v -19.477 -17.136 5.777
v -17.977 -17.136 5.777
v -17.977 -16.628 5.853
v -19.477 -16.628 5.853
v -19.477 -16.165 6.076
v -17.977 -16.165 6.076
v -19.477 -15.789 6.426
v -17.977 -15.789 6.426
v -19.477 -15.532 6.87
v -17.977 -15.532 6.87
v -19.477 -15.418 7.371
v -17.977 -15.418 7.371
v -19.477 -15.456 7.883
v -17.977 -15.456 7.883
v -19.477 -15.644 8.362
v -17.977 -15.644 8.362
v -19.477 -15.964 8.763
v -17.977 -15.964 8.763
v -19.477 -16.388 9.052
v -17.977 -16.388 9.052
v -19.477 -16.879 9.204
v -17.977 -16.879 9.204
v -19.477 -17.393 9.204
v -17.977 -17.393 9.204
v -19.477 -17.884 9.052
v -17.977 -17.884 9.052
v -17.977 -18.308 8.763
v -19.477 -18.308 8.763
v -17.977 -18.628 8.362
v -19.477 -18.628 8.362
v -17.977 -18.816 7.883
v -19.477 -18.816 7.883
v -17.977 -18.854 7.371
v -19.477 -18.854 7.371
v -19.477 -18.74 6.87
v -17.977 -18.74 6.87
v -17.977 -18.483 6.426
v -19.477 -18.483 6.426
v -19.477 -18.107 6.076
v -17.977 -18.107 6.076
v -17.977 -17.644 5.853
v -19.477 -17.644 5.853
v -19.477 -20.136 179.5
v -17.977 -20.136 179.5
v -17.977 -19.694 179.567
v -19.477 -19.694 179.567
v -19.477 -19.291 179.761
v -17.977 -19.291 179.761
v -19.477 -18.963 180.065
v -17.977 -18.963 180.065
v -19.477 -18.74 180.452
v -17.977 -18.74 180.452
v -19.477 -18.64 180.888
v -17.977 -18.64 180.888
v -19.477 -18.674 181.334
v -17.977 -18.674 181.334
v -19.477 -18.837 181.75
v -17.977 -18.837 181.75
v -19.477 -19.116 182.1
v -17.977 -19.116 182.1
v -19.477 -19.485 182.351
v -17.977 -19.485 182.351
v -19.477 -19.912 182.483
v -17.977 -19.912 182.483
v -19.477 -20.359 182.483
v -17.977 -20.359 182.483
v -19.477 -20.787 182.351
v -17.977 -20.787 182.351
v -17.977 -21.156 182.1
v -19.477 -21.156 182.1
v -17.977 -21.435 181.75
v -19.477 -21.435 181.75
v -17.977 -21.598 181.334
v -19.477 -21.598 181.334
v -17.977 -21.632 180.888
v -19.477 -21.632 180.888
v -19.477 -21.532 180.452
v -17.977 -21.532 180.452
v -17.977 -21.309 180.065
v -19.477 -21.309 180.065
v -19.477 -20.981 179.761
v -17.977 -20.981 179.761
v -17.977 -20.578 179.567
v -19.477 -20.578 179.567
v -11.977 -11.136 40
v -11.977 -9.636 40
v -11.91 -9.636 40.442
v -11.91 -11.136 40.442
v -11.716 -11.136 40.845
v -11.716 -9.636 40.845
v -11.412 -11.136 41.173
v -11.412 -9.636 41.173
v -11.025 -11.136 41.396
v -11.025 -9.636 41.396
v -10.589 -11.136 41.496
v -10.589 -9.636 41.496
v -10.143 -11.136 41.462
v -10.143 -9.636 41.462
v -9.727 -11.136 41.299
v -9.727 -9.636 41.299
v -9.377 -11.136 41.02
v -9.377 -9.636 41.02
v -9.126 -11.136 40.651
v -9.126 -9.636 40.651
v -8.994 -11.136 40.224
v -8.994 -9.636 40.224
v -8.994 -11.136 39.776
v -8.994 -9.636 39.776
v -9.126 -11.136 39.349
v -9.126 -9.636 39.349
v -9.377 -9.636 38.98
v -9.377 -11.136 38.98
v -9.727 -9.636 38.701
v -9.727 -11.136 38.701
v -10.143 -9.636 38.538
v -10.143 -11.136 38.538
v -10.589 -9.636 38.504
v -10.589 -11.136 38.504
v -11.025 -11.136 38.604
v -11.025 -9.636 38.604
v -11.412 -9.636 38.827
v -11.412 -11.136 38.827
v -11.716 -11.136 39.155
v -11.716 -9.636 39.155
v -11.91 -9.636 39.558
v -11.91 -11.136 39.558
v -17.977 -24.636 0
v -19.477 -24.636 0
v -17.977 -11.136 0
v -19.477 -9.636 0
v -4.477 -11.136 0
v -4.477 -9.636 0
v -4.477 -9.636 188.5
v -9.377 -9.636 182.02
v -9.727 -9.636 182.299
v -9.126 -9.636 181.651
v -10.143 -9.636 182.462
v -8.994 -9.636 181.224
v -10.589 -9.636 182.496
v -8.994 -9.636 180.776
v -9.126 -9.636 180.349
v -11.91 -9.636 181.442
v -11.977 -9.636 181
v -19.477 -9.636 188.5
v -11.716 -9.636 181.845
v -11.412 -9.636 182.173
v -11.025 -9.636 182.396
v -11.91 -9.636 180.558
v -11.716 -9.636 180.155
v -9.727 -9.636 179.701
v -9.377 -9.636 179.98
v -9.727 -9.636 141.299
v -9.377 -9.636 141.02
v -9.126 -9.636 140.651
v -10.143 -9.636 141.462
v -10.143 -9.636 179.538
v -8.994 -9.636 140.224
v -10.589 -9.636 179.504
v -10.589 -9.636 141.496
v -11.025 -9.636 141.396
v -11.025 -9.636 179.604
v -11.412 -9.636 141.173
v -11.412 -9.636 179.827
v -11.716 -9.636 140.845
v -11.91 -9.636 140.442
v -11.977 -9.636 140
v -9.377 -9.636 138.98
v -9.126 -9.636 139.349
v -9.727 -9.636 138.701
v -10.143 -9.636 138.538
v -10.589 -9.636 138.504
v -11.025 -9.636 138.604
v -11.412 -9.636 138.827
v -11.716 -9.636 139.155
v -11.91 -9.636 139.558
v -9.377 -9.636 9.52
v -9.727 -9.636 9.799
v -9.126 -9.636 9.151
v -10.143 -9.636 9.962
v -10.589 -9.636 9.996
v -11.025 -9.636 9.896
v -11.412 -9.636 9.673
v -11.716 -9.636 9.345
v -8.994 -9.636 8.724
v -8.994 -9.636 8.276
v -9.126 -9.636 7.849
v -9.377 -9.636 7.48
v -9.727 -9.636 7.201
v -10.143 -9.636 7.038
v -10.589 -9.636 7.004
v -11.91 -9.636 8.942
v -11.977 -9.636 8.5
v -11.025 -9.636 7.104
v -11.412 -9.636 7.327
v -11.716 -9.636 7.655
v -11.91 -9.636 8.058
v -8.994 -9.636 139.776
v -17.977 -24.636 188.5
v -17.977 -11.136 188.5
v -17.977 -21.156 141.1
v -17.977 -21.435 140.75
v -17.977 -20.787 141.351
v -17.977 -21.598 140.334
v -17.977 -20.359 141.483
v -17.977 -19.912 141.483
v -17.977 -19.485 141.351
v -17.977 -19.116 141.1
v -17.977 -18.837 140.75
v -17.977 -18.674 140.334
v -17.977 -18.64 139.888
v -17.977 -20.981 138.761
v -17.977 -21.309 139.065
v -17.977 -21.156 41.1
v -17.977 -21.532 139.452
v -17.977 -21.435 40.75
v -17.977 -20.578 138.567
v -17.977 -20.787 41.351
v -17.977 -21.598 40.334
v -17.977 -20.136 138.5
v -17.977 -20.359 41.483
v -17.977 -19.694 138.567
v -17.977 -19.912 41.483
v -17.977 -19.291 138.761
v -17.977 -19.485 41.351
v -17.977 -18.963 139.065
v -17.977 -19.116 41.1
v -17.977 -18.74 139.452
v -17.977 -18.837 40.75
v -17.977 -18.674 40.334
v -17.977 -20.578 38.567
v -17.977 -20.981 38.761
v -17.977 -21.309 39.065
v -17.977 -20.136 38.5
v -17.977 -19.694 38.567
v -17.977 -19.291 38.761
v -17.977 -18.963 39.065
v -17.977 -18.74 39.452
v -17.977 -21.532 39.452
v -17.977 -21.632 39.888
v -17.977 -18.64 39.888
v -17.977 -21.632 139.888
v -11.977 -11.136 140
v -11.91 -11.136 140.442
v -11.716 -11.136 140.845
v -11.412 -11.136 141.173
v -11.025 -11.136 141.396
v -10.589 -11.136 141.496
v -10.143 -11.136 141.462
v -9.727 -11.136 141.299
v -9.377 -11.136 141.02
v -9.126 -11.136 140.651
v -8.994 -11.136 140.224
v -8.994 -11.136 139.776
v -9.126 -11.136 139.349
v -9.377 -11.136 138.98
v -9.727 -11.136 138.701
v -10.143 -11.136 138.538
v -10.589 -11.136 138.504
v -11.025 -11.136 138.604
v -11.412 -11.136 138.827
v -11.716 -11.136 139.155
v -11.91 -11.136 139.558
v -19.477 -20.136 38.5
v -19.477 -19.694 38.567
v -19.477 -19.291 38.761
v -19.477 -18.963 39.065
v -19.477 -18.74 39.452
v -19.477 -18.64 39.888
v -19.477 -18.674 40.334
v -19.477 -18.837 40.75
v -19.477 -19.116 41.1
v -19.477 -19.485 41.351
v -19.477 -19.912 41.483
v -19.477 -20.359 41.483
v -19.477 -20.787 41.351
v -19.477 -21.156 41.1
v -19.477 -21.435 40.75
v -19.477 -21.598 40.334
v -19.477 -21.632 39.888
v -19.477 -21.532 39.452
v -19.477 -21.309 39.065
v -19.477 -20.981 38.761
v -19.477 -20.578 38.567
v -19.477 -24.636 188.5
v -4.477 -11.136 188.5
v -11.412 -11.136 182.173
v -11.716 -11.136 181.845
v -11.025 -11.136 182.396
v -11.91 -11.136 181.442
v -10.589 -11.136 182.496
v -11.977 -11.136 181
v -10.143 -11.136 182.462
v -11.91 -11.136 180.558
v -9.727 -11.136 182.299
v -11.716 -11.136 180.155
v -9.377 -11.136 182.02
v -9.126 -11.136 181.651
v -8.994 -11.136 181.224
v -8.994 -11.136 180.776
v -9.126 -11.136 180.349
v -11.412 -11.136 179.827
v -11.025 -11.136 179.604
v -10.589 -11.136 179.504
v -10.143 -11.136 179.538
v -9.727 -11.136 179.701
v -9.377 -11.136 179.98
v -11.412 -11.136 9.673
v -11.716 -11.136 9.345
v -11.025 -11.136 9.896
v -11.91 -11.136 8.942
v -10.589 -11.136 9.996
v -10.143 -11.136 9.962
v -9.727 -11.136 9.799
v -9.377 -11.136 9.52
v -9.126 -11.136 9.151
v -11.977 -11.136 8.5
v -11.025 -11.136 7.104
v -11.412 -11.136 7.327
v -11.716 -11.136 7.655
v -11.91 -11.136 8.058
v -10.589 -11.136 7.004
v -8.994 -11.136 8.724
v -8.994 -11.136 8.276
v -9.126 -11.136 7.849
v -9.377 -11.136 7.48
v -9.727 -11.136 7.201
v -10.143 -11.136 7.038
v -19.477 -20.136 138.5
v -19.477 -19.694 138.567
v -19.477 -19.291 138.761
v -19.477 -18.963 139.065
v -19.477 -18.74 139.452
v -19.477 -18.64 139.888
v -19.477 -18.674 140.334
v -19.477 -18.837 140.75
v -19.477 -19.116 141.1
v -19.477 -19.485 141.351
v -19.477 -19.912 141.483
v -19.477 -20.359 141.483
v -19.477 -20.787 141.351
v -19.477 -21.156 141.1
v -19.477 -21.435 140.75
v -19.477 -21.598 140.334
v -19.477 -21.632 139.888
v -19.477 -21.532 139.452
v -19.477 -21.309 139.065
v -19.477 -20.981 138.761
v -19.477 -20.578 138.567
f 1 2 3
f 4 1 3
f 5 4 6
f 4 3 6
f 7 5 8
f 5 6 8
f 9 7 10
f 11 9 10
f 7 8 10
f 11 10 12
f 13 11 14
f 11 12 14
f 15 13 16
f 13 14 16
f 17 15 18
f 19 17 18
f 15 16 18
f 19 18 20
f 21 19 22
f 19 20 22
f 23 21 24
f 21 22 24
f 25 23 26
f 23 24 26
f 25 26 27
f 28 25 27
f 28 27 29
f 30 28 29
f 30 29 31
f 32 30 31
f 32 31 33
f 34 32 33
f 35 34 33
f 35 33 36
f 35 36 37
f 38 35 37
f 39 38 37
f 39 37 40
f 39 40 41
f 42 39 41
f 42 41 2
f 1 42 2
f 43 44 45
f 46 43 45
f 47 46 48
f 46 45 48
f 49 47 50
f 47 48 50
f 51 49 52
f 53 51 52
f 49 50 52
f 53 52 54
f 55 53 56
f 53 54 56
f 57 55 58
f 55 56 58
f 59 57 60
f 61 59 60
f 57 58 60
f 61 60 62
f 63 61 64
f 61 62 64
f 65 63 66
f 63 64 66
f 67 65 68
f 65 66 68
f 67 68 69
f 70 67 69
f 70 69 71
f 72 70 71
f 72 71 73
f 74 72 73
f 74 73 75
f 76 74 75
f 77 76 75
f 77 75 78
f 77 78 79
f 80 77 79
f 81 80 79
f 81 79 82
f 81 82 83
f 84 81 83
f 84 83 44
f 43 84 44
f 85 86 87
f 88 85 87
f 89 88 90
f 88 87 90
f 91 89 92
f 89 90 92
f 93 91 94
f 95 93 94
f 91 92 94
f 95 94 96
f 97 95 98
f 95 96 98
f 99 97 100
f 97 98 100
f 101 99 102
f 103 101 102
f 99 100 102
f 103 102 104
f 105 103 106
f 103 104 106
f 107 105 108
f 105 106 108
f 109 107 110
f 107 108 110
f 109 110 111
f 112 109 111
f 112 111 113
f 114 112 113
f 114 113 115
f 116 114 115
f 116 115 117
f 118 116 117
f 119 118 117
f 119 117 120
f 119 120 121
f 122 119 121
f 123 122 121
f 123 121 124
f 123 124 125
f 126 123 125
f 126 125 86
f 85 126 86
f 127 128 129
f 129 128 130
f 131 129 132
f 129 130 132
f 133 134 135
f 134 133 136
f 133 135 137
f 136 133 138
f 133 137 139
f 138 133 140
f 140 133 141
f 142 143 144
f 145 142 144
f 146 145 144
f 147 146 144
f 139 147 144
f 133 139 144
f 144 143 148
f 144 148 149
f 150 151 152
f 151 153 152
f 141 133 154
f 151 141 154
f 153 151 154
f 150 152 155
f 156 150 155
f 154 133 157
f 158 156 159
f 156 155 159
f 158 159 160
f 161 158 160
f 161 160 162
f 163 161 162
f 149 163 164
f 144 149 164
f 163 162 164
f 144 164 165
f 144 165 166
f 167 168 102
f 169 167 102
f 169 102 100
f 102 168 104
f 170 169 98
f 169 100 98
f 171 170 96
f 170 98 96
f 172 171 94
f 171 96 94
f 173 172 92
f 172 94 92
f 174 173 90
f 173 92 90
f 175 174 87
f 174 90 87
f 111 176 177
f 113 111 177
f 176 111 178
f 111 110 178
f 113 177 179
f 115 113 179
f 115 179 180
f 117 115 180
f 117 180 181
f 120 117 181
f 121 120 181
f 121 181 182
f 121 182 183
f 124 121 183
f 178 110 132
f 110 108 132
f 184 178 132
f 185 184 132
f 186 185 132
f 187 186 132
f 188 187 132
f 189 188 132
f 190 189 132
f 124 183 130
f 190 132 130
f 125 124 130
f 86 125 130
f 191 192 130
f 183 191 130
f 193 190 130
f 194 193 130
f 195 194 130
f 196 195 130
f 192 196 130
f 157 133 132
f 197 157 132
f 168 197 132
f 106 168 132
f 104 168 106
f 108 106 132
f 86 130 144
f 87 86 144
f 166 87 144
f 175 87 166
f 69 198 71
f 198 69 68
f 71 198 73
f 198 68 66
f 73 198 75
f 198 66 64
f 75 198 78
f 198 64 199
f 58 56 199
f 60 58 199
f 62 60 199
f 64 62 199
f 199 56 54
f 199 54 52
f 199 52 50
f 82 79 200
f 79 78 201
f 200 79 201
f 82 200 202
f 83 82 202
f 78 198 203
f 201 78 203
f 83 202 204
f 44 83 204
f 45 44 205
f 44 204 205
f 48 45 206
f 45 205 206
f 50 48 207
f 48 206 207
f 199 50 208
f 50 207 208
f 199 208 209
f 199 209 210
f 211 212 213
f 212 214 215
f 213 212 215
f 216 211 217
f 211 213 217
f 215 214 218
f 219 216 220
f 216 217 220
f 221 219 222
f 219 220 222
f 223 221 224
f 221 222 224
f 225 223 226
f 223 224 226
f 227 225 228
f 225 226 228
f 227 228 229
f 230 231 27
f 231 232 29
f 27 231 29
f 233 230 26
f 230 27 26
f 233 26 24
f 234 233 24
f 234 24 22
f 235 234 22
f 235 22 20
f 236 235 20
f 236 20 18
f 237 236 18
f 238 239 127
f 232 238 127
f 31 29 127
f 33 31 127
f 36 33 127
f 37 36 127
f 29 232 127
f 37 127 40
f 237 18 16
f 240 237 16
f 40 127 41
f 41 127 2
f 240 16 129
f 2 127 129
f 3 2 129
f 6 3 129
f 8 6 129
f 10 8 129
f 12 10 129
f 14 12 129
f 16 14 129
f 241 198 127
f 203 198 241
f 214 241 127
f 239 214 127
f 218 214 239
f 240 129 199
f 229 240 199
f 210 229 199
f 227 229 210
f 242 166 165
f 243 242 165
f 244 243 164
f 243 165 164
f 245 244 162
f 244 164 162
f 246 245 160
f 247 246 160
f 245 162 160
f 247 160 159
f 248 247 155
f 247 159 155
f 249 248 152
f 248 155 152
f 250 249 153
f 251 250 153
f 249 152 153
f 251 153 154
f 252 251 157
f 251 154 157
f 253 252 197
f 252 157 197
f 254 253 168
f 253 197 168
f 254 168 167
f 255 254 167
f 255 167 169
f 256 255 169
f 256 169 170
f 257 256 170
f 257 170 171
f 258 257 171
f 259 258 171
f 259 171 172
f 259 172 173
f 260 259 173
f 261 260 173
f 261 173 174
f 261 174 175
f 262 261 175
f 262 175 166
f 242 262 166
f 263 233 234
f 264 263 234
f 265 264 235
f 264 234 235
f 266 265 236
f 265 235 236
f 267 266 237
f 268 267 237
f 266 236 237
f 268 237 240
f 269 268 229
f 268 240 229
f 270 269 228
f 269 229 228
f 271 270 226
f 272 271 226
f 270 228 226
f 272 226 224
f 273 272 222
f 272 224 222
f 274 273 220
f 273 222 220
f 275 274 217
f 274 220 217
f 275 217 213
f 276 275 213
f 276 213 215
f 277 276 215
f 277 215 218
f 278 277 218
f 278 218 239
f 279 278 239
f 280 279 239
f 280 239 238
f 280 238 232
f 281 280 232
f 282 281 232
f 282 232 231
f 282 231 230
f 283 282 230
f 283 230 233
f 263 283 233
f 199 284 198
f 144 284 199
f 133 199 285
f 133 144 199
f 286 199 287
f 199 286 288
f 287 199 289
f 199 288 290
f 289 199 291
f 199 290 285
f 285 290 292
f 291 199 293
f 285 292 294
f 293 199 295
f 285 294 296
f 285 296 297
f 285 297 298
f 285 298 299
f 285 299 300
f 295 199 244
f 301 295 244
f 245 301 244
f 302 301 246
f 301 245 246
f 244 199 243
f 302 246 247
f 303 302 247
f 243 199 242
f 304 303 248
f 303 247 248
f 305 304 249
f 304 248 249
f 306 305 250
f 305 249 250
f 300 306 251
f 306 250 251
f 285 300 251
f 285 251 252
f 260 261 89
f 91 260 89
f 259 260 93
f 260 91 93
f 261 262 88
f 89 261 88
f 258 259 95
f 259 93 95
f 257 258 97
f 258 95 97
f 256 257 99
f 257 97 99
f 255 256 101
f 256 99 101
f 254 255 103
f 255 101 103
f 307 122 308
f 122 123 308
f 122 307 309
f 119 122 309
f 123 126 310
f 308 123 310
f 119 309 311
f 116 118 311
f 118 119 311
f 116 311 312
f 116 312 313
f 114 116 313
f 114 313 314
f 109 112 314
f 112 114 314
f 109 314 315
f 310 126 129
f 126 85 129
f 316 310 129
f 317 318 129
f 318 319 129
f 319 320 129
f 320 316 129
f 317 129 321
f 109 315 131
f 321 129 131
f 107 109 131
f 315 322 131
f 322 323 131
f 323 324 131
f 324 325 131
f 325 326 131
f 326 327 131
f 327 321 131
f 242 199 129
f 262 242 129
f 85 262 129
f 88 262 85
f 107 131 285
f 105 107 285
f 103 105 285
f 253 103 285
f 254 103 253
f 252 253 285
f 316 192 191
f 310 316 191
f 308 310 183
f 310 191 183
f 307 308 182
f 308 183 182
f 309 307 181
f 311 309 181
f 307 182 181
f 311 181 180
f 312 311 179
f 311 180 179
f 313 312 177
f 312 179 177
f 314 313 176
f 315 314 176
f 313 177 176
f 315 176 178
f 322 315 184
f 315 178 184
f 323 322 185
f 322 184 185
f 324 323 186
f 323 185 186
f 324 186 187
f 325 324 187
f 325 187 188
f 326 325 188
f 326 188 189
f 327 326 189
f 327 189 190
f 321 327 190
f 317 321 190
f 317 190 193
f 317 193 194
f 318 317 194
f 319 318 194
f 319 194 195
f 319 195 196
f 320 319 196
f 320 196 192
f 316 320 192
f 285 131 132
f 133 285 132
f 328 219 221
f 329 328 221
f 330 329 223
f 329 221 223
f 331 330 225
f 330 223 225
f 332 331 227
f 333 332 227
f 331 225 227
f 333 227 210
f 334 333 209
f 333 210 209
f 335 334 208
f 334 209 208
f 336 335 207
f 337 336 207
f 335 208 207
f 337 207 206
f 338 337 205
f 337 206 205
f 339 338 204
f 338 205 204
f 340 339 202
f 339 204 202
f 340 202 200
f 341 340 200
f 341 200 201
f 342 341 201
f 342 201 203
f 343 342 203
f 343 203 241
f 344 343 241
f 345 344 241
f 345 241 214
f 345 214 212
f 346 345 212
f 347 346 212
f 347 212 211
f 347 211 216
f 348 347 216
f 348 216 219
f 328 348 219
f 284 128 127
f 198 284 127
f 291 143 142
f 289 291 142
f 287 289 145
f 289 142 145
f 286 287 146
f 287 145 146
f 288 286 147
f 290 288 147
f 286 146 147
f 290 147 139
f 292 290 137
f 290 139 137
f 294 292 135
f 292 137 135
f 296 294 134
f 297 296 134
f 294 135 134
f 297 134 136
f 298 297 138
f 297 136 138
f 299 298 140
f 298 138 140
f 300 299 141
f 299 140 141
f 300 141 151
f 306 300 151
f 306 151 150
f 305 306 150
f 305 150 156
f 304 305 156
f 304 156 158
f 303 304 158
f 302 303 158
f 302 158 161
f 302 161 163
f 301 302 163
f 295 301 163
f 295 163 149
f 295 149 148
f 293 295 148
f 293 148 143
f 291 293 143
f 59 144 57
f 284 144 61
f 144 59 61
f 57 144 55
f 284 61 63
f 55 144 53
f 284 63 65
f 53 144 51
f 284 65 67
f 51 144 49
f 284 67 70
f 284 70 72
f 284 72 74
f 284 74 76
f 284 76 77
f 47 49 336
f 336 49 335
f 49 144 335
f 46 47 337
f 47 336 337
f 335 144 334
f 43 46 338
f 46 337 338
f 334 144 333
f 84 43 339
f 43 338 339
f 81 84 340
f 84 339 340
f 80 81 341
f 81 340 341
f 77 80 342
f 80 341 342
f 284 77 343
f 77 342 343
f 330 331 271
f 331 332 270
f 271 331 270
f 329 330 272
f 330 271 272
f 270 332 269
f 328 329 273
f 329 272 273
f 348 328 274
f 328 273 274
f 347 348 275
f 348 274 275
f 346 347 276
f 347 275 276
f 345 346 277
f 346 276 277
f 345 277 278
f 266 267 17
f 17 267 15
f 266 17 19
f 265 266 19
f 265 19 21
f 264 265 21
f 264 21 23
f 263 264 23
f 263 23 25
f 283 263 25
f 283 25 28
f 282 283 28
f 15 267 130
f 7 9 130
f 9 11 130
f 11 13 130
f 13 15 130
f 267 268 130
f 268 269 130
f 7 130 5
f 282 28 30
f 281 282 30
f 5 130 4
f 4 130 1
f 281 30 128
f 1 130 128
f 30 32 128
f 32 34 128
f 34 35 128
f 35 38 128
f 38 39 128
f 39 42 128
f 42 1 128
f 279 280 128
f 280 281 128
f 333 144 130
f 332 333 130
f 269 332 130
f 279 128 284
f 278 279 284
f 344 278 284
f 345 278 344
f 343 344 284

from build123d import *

# Parameters (mm, degrees)
EXTRUSION1_DEPTH = 188.5
ESQUISSE2_R      = 1.5
EXTRUSION2_DEPTH = 267
ESQUISSE3_R      = 1.5
ESQUISSE3_R_2    = 1.723102606
EXTRUSION3_DEPTH = 10


with BuildPart() as part:
    # Esquisse1 → Extrusion1 (new body)
    with BuildSketch(Plane.XY):
        Polygon((-19.477054801, -9.635894737), (-19.477054801, -24.635894737), (-17.977054801, -24.635894737), (-17.977054801, -11.135894737), (-4.477054801, -11.135894737), (-4.477054801, -9.635894737), align=None)
    extrude(amount=EXTRUSION1_DEPTH)

    # Esquisse2 → Extrusion2 (cut)
    with BuildSketch(Plane(origin=(0, -9.635894737, 0), x_dir=(-1, 0, 0), z_dir=(0, 1, 0))):
        with Locations((10.477054801, 8.5)):
            Circle(ESQUISSE2_R)
        with Locations((10.477054801, 181)):
            Circle(ESQUISSE2_R)
        with Locations((10.477054801, 140)):
            Circle(ESQUISSE2_R)
        with Locations((10.477054801, 40)):
            Circle(ESQUISSE2_R)
    extrude(amount=-EXTRUSION2_DEPTH, mode=Mode.SUBTRACT)

    # Esquisse3 → Extrusion3 (cut)
    with BuildSketch(Plane(origin=(-17.977054801, 0, 0), x_dir=(0, 0, -1), z_dir=(1, 0, 0))):
        with Locations((-40, -20.135894737)):
            Circle(ESQUISSE3_R)
        with Locations((-140, -20.135894737)):
            Circle(ESQUISSE3_R)
        with Locations((-181, -20.135894737)):
            Circle(ESQUISSE3_R)
        with Locations((-7.5, -17.135894737)):
            Circle(ESQUISSE3_R_2)
    extrude(amount=-EXTRUSION3_DEPTH, mode=Mode.SUBTRACT)


solid = part.part
